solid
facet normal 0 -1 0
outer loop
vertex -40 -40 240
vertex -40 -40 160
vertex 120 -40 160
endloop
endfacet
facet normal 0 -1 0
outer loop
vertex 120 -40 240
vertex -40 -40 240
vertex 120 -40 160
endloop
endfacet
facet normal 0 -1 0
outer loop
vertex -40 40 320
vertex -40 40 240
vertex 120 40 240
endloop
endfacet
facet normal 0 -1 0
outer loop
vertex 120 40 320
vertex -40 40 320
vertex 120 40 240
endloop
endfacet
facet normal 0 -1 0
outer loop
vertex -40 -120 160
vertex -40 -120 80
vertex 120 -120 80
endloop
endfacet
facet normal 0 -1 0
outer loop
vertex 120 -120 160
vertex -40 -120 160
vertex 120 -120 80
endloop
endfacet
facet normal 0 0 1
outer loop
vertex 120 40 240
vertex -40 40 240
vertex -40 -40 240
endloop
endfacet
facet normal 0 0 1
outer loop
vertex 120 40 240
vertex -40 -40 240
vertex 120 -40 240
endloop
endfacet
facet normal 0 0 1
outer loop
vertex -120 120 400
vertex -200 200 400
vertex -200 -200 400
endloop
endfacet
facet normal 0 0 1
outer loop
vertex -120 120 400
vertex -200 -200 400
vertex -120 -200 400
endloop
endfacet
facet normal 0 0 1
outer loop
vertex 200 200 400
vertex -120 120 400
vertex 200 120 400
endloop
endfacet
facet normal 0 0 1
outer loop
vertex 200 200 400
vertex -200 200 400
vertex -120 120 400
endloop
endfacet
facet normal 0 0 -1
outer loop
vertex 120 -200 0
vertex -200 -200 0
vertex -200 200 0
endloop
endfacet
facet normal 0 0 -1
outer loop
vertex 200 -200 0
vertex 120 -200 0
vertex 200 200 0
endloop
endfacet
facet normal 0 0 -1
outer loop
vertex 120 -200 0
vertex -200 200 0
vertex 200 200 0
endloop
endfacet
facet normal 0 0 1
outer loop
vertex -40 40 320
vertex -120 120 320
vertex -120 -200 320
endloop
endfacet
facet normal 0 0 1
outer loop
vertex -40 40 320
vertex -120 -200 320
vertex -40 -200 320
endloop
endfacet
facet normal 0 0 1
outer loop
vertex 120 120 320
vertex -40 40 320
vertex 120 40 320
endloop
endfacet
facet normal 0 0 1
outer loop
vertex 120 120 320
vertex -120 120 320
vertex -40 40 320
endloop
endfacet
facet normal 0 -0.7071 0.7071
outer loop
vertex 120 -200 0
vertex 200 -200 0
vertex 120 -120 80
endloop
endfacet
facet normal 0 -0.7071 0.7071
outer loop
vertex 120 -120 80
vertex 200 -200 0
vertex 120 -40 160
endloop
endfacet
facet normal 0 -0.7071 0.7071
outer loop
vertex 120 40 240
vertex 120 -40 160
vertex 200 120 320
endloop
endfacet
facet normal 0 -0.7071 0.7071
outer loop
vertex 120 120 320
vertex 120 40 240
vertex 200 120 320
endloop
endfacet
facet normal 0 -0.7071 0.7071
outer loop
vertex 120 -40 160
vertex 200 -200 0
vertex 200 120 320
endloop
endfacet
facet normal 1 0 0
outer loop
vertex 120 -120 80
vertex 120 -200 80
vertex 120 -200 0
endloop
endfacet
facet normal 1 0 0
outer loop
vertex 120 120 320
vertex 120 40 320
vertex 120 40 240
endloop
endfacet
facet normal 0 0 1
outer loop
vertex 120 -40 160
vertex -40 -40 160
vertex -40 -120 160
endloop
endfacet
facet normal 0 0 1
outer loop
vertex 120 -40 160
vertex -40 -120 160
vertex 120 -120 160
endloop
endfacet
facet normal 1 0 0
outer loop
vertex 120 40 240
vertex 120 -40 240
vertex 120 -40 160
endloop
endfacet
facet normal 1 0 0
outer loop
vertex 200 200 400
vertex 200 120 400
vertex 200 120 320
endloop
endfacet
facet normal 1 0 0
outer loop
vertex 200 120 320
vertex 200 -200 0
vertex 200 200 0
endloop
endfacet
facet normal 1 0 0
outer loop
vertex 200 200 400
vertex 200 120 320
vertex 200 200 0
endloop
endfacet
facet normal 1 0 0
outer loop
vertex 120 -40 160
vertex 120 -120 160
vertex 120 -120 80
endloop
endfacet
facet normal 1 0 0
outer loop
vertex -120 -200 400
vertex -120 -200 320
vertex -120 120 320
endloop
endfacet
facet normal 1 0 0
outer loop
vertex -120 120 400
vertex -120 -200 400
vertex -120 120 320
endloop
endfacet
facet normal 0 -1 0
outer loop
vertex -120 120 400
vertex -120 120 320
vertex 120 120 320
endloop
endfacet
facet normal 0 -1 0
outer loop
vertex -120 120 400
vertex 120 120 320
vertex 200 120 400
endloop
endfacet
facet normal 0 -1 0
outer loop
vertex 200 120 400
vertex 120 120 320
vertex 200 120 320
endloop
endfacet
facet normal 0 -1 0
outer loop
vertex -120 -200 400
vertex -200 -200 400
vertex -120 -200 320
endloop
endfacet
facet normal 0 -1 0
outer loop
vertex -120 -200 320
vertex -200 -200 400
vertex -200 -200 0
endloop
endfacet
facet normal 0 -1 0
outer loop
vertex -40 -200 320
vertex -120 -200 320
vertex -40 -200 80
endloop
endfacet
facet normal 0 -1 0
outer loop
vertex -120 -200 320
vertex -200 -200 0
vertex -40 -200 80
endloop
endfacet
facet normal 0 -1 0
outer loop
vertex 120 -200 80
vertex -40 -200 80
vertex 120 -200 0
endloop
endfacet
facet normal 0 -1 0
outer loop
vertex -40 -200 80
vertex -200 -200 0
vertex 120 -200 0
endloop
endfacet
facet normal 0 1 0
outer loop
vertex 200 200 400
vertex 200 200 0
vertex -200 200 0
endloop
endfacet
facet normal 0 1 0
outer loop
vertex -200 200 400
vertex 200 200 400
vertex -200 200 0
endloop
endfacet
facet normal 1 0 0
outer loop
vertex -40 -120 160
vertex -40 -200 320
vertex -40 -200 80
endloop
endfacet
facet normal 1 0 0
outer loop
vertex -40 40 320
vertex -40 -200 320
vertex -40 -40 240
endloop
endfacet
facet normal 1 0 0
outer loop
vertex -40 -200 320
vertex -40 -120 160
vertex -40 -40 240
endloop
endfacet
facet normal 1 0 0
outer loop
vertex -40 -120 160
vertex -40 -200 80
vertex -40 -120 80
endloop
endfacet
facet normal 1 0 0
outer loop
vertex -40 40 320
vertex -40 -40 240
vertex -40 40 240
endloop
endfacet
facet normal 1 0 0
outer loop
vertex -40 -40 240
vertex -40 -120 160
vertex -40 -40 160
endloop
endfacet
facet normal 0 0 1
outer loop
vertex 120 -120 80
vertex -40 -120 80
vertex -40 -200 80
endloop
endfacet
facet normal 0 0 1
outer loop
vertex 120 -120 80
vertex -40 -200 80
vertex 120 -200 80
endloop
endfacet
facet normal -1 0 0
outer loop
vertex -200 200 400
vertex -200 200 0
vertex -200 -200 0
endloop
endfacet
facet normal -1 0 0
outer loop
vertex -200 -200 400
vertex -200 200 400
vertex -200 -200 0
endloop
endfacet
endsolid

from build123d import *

# Parameters (mm, degrees)
F1_DEPTH = 400
F0_W     = 160
F0_H     = 80
F2_DEPTH = 80
F3_DEPTH = 160
F4_DEPTH = 240
F5_DEPTH = 320
F6_DEPTH = 320
F8_DEPTH = 80


with BuildPart() as f1:
    # F0 (on Top) → F1 (new body)
    with BuildSketch(Plane.XY):
        Polygon((200, 200), (-200, 200), (-200, -200), (-120, -200), (-120, 120), (120, 120), (200, 120), align=None)
    extrude(amount=F1_DEPTH)



with BuildPart() as f2:
    # F0 (on Top) → F2 (new body)
    with BuildSketch(Plane.XY):
        with Locations((40, -160)):
            Rectangle(F0_W, F0_H)
    extrude(amount=F2_DEPTH)

    # F0 (on Top) → F3 (join)
    with BuildSketch(Plane.XY):
        with Locations((40, -80)):
            Rectangle(F0_W, F0_H)
    extrude(amount=F3_DEPTH)

    # F0 (on Top) → F4 (join)
    with BuildSketch(Plane.XY):
        with Locations((40, 0)):
            Rectangle(F0_W, F0_H)
    extrude(amount=F4_DEPTH)


with BuildPart() as f1_1:
    add(f1.part)

    add(f2.part)  # F5 merges F2
    # F0 (on Top) → F5 (join)
    with BuildSketch(Plane.XY):
        Polygon((-120, 120), (-120, -200), (-40, -200), (-40, -120), (-40, -40), (-40, 40), (120, 40), (120, 120), align=None)
    extrude(amount=F5_DEPTH)

    # F0 (on Top) → F6 (join)
    with BuildSketch(Plane.XY):
        Polygon((200, -200), (200, 120), (120, 120), (120, 40), (120, -40), (120, -120), (120, -200), align=None)
    extrude(amount=F6_DEPTH)

    # F7 (on face) → F8 (cut)
    with BuildSketch(Plane.YZ.offset(200)):
        Polygon((-200, 0), (120, 320), (-200, 320), align=None)
    extrude(amount=-F8_DEPTH, mode=Mode.SUBTRACT)


solid = f1_1.part
